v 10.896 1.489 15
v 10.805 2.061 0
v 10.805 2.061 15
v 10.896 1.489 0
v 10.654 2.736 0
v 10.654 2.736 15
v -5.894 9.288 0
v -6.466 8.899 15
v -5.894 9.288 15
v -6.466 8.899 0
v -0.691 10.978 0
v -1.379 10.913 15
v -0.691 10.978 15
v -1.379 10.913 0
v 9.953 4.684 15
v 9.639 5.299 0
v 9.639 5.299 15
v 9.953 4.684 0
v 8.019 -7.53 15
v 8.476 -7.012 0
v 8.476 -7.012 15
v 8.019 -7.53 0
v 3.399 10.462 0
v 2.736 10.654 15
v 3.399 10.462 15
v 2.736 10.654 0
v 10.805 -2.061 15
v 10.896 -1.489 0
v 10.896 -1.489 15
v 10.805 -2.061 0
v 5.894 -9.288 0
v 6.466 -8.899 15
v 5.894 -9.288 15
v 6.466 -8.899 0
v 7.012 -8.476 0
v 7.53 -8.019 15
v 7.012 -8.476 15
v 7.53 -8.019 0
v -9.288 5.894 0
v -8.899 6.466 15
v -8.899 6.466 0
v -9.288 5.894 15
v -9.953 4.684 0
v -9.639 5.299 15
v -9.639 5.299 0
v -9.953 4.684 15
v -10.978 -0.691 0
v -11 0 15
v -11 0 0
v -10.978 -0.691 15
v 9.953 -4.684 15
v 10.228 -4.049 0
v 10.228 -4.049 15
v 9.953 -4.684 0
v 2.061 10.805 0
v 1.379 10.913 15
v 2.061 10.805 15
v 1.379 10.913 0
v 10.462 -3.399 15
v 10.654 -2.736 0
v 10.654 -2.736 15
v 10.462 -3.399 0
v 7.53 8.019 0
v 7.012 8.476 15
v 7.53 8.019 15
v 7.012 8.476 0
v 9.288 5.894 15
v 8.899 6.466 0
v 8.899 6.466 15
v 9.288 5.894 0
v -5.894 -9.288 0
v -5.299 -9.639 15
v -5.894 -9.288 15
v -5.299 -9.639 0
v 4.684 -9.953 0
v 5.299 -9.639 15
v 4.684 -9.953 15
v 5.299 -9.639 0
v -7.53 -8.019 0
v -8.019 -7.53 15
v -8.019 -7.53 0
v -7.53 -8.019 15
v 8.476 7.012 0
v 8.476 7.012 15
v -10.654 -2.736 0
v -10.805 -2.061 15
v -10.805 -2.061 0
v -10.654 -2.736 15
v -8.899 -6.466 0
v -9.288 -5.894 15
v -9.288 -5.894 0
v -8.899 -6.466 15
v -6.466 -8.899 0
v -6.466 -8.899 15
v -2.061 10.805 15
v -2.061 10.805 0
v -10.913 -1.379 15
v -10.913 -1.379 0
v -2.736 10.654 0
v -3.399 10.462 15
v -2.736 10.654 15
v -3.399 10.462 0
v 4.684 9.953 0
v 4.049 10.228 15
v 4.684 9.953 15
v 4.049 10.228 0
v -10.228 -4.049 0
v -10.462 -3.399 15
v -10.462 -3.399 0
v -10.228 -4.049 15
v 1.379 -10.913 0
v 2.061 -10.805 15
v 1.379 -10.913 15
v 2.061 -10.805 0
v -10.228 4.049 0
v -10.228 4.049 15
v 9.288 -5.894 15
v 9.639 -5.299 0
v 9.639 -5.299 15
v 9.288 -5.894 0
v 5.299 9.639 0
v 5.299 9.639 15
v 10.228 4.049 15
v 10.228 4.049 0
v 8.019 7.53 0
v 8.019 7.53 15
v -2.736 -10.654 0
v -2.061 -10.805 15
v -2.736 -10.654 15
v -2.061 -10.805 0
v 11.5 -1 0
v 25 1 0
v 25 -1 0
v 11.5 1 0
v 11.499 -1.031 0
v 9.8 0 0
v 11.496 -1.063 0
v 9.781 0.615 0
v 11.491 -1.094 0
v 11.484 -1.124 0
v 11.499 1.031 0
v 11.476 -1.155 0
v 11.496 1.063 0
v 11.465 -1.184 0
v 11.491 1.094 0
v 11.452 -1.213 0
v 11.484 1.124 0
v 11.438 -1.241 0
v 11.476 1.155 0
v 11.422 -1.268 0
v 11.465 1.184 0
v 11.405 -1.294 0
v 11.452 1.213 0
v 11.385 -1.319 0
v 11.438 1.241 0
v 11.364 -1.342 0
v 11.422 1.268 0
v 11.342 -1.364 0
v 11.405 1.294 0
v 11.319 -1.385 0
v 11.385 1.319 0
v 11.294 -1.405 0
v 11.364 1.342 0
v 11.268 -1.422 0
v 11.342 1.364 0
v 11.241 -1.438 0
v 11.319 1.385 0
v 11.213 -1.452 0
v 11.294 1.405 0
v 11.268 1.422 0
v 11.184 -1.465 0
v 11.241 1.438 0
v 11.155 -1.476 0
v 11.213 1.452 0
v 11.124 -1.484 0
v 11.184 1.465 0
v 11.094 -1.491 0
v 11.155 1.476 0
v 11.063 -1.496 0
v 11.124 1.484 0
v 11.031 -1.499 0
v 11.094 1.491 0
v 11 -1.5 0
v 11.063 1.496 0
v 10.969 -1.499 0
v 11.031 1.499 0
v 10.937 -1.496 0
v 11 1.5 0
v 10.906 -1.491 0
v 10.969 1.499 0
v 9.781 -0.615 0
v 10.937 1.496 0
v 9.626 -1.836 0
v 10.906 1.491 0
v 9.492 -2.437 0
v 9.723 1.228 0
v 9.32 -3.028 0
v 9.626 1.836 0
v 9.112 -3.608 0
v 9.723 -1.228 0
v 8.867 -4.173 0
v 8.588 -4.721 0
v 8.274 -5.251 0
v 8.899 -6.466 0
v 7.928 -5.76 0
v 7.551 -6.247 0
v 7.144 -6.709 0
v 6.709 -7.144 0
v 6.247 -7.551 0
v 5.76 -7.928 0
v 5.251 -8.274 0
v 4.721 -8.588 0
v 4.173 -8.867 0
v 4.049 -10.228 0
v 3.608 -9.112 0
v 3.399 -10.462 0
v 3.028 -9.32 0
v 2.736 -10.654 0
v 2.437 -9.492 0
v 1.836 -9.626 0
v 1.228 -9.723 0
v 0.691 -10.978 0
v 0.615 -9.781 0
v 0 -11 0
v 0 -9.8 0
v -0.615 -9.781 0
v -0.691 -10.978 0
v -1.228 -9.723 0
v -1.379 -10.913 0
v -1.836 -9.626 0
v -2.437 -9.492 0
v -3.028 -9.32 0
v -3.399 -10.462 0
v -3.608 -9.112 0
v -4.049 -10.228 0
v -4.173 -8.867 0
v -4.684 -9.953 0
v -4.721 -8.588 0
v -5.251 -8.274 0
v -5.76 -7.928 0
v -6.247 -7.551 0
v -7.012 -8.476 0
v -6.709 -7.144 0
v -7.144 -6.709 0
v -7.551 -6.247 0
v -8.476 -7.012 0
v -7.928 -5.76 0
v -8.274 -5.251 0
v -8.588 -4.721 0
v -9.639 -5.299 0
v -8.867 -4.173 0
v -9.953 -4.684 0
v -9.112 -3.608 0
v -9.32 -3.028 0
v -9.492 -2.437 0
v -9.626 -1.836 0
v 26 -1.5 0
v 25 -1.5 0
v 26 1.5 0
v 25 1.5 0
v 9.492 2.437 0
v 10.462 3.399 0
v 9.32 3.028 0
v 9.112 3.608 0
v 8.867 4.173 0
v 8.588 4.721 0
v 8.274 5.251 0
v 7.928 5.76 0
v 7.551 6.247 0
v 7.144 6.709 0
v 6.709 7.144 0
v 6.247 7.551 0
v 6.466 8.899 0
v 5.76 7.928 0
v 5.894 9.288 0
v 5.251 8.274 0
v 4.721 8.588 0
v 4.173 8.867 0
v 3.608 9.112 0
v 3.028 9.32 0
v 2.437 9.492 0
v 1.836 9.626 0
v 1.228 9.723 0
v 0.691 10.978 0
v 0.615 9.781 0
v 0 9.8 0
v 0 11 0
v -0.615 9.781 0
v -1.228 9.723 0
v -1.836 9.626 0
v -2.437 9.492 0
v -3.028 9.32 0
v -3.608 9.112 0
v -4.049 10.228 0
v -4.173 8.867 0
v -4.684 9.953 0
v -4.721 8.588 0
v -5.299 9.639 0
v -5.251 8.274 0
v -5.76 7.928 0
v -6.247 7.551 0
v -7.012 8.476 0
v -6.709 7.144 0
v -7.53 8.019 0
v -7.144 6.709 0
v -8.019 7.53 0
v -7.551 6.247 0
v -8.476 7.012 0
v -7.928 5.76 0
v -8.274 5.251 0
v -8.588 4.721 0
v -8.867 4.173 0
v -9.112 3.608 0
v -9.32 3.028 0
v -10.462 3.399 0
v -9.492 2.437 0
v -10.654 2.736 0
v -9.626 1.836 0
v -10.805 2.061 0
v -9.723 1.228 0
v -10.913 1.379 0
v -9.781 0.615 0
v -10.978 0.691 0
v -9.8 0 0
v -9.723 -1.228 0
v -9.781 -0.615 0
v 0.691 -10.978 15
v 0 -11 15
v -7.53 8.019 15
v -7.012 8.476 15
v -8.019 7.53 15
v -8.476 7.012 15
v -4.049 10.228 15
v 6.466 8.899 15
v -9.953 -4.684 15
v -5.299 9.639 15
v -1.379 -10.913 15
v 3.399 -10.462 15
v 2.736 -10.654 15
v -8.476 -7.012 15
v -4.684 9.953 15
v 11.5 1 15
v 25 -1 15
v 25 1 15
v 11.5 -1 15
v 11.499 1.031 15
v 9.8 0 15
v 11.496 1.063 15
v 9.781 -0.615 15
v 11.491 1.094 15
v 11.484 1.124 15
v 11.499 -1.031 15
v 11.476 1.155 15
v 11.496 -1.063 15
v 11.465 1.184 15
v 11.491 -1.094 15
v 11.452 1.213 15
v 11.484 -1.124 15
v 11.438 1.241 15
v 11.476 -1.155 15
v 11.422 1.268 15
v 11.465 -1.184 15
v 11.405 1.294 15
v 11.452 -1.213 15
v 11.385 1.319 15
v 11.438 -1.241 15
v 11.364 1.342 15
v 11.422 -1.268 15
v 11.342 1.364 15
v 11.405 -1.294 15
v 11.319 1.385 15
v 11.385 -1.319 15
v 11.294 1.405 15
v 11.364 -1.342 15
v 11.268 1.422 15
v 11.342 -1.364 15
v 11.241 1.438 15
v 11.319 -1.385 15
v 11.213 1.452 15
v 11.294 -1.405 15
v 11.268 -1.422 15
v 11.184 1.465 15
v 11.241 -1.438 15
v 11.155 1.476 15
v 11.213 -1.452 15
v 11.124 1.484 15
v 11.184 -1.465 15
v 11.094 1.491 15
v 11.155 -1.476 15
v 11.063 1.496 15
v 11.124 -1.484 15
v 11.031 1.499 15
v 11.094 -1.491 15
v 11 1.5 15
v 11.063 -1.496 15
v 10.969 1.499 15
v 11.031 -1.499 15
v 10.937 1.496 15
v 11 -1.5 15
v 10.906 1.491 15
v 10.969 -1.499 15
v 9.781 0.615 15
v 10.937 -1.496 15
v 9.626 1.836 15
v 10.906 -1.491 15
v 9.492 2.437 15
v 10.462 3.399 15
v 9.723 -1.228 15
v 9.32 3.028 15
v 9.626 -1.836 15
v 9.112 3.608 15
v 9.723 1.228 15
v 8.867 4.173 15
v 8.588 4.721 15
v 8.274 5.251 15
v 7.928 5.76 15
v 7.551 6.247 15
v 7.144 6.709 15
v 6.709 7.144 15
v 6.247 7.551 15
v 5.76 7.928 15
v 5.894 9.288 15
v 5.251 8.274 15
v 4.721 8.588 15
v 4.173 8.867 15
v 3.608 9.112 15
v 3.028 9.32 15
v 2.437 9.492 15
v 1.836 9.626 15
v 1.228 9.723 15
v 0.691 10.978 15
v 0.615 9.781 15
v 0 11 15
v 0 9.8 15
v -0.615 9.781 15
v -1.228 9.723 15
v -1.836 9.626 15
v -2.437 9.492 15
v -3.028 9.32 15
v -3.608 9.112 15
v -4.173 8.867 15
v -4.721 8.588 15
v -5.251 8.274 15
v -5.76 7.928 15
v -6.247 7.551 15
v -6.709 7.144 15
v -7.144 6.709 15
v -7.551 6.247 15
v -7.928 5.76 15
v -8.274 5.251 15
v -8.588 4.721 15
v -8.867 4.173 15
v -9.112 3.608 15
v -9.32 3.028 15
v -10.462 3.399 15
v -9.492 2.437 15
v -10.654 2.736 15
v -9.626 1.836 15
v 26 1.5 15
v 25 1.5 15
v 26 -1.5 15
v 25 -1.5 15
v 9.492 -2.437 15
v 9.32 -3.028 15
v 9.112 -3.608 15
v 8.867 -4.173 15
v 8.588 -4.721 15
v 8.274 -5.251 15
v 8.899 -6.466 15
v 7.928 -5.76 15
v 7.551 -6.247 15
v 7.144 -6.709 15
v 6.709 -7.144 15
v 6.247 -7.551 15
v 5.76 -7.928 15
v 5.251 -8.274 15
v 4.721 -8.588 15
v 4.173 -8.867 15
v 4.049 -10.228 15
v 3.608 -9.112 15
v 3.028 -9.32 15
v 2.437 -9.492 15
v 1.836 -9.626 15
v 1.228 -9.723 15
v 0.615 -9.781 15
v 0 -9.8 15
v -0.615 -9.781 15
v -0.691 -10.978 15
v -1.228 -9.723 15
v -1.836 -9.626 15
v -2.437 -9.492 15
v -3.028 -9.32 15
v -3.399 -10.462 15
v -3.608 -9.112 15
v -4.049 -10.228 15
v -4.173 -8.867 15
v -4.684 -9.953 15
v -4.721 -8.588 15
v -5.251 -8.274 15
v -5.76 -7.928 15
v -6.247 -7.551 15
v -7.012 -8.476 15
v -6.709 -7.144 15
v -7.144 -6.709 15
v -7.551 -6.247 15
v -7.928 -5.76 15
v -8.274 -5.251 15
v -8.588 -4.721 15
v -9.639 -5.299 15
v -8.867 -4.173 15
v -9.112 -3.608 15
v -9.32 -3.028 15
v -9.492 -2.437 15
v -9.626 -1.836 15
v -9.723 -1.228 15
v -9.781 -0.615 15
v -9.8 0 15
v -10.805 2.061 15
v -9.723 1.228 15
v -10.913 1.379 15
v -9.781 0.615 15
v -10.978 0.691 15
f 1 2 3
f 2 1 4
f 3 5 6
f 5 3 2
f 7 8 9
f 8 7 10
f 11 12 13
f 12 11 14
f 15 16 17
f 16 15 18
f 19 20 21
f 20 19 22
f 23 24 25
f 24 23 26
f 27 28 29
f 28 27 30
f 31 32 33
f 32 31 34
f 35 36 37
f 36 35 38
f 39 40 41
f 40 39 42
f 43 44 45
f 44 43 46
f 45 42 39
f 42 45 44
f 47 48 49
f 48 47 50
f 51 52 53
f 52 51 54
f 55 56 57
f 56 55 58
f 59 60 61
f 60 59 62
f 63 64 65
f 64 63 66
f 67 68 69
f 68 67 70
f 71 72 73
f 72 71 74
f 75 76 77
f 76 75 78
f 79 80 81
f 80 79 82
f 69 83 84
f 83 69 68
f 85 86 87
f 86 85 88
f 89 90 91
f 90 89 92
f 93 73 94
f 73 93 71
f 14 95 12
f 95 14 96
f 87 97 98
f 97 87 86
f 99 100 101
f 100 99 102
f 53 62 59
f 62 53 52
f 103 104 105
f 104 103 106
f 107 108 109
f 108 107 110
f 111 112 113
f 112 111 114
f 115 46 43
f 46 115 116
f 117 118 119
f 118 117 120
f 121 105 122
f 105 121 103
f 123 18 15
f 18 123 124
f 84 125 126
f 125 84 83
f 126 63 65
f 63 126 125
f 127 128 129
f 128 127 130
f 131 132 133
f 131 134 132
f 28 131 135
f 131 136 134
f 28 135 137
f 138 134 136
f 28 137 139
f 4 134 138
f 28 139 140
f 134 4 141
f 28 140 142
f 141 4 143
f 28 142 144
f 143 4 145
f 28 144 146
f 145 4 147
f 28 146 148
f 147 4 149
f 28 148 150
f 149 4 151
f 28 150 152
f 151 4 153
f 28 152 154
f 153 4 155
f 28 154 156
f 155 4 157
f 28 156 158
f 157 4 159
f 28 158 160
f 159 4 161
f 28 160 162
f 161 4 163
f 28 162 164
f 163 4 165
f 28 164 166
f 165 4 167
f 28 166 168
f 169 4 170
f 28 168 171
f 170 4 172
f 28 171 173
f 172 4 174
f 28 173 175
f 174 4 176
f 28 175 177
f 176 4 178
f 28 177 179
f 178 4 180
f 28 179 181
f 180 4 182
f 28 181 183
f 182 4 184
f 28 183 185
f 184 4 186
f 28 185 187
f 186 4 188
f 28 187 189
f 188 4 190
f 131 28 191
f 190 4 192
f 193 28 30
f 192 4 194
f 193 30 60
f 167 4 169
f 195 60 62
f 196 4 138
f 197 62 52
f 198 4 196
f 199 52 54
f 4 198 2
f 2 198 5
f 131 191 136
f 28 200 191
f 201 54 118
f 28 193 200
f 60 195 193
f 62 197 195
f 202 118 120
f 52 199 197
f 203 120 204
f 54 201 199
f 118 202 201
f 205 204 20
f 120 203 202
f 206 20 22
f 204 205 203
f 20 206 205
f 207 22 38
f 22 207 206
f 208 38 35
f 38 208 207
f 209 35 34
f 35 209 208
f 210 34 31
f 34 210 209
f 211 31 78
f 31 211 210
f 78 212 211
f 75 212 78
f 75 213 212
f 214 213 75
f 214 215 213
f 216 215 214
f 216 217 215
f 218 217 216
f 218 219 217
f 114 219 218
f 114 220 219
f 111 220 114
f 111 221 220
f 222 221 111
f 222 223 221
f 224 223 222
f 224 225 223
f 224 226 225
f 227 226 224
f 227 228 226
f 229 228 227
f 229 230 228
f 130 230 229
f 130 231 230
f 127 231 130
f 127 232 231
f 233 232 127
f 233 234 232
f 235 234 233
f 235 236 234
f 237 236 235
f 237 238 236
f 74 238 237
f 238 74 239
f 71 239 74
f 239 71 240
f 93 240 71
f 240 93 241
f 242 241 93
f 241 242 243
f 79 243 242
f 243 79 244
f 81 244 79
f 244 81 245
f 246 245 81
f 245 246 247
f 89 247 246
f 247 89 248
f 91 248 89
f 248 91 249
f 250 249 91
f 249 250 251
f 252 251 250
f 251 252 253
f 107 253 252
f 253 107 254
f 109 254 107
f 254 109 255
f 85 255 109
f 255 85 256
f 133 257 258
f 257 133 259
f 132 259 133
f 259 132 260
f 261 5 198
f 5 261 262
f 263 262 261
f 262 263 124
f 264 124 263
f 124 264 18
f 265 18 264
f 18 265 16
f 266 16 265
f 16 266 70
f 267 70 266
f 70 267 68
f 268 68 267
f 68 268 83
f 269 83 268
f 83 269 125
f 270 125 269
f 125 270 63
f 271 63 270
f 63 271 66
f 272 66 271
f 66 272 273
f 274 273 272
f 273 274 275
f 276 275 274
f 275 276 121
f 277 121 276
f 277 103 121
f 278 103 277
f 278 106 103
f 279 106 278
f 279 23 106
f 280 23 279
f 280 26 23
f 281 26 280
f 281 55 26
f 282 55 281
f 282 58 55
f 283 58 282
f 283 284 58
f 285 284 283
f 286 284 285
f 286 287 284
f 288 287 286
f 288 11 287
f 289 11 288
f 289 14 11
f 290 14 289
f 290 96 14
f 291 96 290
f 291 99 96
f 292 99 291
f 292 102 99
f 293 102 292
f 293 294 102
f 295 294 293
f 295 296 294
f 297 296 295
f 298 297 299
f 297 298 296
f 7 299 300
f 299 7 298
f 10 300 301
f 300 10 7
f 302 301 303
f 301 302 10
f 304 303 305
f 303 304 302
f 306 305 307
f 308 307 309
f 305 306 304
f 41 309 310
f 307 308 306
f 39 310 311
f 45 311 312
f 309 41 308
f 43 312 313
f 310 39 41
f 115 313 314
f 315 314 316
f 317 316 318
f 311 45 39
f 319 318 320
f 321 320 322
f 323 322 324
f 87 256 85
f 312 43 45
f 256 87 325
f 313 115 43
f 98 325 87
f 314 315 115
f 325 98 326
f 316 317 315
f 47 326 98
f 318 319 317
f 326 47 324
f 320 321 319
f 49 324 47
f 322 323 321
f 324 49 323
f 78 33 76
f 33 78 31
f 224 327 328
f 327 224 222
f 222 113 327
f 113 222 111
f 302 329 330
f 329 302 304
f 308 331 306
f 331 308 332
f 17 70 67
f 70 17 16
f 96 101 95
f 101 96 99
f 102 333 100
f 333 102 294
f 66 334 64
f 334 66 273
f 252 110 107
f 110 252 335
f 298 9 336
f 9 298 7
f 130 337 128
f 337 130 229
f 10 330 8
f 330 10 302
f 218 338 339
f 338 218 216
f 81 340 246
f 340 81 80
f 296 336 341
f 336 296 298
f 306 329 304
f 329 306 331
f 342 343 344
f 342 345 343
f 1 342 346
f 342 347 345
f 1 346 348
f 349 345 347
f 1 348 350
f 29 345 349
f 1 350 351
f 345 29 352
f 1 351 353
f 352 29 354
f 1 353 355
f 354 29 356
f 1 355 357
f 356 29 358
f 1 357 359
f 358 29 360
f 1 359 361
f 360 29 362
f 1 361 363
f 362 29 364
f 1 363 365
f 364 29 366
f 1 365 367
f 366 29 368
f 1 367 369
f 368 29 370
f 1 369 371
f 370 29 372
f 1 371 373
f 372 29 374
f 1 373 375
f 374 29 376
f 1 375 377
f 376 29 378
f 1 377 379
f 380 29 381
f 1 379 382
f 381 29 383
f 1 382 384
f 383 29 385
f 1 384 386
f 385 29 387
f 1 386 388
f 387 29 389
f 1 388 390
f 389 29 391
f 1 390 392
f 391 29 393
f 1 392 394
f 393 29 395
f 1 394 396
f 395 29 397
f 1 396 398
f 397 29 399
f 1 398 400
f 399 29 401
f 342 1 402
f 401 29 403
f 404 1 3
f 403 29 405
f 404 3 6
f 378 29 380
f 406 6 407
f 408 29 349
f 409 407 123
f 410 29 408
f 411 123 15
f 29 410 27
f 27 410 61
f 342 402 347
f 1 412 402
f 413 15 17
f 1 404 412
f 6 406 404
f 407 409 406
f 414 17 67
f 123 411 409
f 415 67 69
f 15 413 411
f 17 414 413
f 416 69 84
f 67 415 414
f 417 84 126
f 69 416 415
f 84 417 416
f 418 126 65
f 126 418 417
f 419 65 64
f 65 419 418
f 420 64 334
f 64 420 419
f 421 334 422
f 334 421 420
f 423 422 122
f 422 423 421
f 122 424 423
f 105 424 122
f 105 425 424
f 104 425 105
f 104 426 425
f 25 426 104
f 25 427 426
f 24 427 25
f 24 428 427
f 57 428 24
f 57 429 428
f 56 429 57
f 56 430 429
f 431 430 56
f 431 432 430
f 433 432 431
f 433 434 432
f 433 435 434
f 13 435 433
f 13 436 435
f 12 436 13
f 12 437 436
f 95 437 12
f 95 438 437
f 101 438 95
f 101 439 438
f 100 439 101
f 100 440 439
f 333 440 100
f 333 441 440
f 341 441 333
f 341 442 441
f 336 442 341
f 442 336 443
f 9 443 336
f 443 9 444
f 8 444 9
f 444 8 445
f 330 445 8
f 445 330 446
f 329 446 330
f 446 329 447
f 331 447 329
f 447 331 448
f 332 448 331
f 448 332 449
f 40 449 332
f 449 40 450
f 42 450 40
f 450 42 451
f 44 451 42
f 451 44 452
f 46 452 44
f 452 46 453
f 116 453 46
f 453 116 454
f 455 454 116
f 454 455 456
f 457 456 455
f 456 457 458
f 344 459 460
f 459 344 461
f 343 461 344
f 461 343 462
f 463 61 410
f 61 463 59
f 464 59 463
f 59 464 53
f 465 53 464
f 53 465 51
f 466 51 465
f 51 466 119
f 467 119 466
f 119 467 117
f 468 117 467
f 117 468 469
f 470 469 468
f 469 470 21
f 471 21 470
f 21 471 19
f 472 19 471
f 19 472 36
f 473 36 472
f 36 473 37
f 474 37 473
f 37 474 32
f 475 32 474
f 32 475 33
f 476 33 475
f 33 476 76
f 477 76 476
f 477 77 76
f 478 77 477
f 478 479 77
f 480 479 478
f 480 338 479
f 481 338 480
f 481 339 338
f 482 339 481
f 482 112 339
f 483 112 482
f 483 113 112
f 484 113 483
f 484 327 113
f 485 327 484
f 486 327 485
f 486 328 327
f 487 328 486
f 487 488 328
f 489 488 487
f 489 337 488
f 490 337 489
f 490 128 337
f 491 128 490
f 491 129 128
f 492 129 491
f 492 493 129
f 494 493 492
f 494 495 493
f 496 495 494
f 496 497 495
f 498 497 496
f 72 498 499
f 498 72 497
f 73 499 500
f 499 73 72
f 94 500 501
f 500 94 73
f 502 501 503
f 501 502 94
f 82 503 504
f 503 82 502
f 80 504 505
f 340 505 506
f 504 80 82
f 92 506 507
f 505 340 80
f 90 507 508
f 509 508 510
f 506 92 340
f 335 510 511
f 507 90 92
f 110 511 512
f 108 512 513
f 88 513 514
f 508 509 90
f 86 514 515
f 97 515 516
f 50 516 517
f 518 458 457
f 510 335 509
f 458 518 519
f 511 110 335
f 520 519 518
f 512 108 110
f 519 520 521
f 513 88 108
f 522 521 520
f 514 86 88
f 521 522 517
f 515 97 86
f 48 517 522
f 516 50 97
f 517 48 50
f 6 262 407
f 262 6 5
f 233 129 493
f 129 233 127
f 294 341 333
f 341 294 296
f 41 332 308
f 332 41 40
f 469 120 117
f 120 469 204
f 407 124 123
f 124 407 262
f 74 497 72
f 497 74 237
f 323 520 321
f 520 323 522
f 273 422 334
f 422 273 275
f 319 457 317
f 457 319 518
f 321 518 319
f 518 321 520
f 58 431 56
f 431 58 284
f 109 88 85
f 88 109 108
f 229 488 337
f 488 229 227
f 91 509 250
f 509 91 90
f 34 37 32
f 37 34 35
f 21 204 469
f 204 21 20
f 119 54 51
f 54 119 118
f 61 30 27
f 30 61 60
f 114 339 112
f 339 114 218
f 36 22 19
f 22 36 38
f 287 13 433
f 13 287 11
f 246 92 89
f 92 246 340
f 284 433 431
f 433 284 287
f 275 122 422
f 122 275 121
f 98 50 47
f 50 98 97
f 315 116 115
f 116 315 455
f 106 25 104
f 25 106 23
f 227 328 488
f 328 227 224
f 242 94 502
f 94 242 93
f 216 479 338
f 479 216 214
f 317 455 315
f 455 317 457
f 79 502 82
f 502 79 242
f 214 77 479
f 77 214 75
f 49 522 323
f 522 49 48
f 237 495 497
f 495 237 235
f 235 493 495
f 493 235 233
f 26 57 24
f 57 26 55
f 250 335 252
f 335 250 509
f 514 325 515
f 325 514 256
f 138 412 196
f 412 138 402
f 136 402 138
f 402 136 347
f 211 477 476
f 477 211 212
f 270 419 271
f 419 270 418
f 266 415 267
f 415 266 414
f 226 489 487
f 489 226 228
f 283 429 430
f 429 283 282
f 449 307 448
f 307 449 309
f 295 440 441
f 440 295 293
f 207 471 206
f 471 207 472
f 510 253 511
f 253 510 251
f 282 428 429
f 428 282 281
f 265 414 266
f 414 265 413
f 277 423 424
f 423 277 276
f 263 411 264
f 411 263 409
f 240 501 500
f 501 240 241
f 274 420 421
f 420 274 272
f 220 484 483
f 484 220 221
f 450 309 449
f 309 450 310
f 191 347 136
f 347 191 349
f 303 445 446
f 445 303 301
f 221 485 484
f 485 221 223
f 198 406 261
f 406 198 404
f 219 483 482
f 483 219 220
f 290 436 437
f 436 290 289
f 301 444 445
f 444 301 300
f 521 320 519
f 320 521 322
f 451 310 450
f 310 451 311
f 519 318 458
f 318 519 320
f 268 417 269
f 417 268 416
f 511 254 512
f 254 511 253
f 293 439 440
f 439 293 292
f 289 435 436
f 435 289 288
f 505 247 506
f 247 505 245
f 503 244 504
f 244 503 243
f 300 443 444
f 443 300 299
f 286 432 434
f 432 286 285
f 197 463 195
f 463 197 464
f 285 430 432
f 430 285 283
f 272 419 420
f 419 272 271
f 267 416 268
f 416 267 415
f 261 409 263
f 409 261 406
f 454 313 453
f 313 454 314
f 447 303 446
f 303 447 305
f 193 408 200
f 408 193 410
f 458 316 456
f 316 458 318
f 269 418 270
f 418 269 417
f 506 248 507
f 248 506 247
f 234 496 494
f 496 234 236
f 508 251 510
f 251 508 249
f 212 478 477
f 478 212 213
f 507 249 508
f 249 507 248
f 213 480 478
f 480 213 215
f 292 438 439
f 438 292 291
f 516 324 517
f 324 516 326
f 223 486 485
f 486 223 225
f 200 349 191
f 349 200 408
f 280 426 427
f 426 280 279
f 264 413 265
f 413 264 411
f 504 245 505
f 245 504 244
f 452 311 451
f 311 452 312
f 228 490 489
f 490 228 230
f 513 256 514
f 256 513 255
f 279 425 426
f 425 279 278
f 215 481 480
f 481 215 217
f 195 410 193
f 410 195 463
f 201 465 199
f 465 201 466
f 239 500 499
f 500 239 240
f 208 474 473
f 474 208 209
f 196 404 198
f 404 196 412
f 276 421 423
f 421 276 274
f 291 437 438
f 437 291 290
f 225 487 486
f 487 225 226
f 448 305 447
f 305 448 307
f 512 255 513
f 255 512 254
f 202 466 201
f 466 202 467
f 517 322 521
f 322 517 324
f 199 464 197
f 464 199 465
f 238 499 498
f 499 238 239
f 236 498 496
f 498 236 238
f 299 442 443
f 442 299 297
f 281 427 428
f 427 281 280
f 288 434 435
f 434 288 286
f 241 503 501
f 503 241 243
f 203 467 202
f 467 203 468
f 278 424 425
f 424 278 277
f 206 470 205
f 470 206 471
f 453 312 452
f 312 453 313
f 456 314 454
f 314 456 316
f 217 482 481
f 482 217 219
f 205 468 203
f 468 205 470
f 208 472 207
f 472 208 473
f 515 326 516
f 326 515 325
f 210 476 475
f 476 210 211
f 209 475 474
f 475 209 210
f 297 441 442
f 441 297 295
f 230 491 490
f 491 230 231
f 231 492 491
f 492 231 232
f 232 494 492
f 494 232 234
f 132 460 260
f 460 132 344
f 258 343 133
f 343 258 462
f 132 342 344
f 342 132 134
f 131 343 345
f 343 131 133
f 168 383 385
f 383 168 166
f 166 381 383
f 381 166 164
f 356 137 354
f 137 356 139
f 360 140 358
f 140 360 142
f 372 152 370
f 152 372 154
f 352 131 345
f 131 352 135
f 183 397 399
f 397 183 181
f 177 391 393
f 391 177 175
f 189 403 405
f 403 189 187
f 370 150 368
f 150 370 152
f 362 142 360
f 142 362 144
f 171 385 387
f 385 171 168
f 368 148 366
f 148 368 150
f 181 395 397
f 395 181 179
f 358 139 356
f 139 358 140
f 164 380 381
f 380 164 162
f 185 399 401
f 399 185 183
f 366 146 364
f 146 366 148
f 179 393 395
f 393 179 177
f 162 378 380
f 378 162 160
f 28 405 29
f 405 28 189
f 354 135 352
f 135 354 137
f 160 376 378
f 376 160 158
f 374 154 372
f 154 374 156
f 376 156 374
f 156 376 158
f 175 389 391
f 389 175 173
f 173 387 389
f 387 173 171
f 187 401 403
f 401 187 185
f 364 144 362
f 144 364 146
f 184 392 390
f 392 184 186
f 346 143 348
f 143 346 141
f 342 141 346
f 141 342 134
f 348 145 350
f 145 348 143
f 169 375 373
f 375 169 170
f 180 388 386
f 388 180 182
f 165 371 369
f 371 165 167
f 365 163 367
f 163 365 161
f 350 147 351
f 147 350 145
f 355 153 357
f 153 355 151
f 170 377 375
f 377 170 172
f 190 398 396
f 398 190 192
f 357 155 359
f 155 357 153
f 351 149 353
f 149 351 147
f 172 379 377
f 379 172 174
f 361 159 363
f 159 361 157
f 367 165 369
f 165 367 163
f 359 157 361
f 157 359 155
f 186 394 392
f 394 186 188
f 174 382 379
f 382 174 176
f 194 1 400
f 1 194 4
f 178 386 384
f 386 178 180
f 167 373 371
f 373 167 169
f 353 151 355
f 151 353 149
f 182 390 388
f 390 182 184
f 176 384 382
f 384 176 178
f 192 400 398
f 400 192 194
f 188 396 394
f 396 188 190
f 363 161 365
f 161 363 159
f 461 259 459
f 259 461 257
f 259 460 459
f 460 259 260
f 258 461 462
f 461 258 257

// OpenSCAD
$fn=100; 
width=15;
inner=19.6;
outer=22;

 difference() {
     cylinder(h=width, d=outer);
     cylinder(h=width, d=inner);
}
        translate([outer/2-1,-1,0]) {
           cube([15,2,width]);
        }
 
        translate([outer/2,-1,0]) {
           cylinder(h=width,d=1);
        }     
        translate([outer/2,1,0]) {
           cylinder(h=width,d=1);
        }
                translate([outer/2+width-1,-1.5,0]) {
                               cube([1,3,width]);

        }     
